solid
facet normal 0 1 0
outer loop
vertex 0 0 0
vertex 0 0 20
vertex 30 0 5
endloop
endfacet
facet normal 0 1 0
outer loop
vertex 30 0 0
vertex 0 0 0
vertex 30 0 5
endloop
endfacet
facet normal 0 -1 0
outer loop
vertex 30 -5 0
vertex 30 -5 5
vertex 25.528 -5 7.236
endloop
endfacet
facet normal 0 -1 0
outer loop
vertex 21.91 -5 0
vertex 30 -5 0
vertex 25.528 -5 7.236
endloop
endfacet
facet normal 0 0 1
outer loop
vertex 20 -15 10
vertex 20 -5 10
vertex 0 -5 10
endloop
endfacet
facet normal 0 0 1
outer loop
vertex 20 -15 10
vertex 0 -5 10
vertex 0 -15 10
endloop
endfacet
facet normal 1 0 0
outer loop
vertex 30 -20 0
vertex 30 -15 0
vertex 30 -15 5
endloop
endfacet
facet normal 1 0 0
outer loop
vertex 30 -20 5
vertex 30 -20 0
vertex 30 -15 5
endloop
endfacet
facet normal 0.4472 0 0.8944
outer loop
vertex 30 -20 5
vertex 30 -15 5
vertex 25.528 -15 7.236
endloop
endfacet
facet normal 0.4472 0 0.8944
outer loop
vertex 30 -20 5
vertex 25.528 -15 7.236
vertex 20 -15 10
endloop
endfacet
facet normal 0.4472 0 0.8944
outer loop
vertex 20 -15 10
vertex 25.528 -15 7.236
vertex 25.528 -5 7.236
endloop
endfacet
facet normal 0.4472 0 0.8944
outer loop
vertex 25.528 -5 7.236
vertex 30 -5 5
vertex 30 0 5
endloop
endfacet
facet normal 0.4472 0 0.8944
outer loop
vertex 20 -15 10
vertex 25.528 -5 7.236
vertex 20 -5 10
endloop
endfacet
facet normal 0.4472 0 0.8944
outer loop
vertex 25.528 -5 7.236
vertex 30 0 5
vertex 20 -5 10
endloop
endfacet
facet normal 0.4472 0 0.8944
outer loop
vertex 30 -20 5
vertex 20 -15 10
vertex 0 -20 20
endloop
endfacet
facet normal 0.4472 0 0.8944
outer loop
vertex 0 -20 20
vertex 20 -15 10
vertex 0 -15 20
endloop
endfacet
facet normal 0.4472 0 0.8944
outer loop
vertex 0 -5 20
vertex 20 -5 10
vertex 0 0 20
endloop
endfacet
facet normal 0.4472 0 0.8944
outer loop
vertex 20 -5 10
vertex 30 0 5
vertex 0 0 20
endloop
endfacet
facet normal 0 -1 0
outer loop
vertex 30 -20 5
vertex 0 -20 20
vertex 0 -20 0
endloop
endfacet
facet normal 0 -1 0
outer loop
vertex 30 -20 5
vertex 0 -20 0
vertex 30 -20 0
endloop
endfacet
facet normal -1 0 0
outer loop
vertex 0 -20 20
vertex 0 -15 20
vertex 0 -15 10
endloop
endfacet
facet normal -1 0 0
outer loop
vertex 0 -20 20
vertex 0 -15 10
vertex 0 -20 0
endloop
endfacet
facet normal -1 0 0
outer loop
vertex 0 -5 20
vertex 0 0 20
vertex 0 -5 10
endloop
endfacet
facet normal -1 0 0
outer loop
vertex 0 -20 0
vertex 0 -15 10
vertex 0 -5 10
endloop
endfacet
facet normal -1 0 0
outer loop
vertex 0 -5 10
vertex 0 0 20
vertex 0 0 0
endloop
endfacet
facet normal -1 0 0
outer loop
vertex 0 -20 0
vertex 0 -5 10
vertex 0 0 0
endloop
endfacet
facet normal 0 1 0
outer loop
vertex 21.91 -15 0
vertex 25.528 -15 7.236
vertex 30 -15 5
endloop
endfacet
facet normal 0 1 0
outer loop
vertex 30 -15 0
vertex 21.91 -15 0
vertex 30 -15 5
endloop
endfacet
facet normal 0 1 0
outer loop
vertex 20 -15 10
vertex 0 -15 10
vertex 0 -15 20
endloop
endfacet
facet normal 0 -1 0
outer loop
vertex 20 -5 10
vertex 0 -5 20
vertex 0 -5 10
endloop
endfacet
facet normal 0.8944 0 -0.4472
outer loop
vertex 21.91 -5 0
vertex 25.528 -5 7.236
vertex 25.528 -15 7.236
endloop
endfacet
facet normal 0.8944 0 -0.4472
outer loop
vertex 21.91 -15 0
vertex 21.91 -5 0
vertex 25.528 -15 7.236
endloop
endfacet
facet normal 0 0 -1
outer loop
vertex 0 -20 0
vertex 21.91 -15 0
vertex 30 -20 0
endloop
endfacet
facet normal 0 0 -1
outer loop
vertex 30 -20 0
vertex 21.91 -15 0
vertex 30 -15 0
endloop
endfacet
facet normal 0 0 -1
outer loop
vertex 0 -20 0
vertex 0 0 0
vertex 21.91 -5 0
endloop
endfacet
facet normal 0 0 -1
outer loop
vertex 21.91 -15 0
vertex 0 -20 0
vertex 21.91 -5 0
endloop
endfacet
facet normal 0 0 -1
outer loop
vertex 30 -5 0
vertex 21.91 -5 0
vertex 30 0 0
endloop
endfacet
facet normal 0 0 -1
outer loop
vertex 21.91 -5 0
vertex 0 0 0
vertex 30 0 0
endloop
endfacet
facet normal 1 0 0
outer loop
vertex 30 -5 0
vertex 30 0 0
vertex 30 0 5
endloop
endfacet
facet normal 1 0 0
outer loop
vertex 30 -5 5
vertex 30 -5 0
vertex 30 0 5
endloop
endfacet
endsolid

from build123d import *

# Parameters (mm, degrees)
F1_DEPTH = 20
F3_DEPTH = 17.88954382
F4_W     = 10
F4_H     = 5
F5_DEPTH = 2.501
F7_DEPTH = 30.001


with BuildPart() as f1:
    # F0 (on Front) → F1 (new body)
    with BuildSketch(Plane.XZ):
        Polygon((0, 20), (0, 0), (30, 0), (30, 5), align=None)
    extrude(amount=F1_DEPTH)

    # F2 (on face) → F3 (cut, through all)
    with BuildSketch(Plane(origin=(8, 0, 16), x_dir=(0.894427191, 0, -0.4472135955), z_dir=(0.4472135955, 0, 0.894427191))):
        Polygon((24.5967477525, -15), (24.5967477525, -10), (24.5967477525, -5), (19.5967477525, -5), (19.5967477525, -10), (19.5967477525, -15), align=None)
    extrude(amount=-F3_DEPTH, mode=Mode.SUBTRACT)

    # F4 (on face) → F5 (cut, through all)
    with BuildSketch(Plane.YZ.offset(30)):
        with Locations((-10, 2.5)):
            Rectangle(F4_W, F4_H)
    extrude(amount=-F5_DEPTH, mode=Mode.SUBTRACT)

    # F6 (on face) → F7 (cut, through all)
    with BuildSketch(Plane(origin=(0, 0, 0), x_dir=(0, -1, 0), z_dir=(-1, 0, 0))):
        Polygon((15, 20), (10, 20), (5, 20), (5, 10), (10, 10), (15, 10), align=None)
    extrude(amount=-F7_DEPTH, mode=Mode.SUBTRACT)


solid = f1.part
